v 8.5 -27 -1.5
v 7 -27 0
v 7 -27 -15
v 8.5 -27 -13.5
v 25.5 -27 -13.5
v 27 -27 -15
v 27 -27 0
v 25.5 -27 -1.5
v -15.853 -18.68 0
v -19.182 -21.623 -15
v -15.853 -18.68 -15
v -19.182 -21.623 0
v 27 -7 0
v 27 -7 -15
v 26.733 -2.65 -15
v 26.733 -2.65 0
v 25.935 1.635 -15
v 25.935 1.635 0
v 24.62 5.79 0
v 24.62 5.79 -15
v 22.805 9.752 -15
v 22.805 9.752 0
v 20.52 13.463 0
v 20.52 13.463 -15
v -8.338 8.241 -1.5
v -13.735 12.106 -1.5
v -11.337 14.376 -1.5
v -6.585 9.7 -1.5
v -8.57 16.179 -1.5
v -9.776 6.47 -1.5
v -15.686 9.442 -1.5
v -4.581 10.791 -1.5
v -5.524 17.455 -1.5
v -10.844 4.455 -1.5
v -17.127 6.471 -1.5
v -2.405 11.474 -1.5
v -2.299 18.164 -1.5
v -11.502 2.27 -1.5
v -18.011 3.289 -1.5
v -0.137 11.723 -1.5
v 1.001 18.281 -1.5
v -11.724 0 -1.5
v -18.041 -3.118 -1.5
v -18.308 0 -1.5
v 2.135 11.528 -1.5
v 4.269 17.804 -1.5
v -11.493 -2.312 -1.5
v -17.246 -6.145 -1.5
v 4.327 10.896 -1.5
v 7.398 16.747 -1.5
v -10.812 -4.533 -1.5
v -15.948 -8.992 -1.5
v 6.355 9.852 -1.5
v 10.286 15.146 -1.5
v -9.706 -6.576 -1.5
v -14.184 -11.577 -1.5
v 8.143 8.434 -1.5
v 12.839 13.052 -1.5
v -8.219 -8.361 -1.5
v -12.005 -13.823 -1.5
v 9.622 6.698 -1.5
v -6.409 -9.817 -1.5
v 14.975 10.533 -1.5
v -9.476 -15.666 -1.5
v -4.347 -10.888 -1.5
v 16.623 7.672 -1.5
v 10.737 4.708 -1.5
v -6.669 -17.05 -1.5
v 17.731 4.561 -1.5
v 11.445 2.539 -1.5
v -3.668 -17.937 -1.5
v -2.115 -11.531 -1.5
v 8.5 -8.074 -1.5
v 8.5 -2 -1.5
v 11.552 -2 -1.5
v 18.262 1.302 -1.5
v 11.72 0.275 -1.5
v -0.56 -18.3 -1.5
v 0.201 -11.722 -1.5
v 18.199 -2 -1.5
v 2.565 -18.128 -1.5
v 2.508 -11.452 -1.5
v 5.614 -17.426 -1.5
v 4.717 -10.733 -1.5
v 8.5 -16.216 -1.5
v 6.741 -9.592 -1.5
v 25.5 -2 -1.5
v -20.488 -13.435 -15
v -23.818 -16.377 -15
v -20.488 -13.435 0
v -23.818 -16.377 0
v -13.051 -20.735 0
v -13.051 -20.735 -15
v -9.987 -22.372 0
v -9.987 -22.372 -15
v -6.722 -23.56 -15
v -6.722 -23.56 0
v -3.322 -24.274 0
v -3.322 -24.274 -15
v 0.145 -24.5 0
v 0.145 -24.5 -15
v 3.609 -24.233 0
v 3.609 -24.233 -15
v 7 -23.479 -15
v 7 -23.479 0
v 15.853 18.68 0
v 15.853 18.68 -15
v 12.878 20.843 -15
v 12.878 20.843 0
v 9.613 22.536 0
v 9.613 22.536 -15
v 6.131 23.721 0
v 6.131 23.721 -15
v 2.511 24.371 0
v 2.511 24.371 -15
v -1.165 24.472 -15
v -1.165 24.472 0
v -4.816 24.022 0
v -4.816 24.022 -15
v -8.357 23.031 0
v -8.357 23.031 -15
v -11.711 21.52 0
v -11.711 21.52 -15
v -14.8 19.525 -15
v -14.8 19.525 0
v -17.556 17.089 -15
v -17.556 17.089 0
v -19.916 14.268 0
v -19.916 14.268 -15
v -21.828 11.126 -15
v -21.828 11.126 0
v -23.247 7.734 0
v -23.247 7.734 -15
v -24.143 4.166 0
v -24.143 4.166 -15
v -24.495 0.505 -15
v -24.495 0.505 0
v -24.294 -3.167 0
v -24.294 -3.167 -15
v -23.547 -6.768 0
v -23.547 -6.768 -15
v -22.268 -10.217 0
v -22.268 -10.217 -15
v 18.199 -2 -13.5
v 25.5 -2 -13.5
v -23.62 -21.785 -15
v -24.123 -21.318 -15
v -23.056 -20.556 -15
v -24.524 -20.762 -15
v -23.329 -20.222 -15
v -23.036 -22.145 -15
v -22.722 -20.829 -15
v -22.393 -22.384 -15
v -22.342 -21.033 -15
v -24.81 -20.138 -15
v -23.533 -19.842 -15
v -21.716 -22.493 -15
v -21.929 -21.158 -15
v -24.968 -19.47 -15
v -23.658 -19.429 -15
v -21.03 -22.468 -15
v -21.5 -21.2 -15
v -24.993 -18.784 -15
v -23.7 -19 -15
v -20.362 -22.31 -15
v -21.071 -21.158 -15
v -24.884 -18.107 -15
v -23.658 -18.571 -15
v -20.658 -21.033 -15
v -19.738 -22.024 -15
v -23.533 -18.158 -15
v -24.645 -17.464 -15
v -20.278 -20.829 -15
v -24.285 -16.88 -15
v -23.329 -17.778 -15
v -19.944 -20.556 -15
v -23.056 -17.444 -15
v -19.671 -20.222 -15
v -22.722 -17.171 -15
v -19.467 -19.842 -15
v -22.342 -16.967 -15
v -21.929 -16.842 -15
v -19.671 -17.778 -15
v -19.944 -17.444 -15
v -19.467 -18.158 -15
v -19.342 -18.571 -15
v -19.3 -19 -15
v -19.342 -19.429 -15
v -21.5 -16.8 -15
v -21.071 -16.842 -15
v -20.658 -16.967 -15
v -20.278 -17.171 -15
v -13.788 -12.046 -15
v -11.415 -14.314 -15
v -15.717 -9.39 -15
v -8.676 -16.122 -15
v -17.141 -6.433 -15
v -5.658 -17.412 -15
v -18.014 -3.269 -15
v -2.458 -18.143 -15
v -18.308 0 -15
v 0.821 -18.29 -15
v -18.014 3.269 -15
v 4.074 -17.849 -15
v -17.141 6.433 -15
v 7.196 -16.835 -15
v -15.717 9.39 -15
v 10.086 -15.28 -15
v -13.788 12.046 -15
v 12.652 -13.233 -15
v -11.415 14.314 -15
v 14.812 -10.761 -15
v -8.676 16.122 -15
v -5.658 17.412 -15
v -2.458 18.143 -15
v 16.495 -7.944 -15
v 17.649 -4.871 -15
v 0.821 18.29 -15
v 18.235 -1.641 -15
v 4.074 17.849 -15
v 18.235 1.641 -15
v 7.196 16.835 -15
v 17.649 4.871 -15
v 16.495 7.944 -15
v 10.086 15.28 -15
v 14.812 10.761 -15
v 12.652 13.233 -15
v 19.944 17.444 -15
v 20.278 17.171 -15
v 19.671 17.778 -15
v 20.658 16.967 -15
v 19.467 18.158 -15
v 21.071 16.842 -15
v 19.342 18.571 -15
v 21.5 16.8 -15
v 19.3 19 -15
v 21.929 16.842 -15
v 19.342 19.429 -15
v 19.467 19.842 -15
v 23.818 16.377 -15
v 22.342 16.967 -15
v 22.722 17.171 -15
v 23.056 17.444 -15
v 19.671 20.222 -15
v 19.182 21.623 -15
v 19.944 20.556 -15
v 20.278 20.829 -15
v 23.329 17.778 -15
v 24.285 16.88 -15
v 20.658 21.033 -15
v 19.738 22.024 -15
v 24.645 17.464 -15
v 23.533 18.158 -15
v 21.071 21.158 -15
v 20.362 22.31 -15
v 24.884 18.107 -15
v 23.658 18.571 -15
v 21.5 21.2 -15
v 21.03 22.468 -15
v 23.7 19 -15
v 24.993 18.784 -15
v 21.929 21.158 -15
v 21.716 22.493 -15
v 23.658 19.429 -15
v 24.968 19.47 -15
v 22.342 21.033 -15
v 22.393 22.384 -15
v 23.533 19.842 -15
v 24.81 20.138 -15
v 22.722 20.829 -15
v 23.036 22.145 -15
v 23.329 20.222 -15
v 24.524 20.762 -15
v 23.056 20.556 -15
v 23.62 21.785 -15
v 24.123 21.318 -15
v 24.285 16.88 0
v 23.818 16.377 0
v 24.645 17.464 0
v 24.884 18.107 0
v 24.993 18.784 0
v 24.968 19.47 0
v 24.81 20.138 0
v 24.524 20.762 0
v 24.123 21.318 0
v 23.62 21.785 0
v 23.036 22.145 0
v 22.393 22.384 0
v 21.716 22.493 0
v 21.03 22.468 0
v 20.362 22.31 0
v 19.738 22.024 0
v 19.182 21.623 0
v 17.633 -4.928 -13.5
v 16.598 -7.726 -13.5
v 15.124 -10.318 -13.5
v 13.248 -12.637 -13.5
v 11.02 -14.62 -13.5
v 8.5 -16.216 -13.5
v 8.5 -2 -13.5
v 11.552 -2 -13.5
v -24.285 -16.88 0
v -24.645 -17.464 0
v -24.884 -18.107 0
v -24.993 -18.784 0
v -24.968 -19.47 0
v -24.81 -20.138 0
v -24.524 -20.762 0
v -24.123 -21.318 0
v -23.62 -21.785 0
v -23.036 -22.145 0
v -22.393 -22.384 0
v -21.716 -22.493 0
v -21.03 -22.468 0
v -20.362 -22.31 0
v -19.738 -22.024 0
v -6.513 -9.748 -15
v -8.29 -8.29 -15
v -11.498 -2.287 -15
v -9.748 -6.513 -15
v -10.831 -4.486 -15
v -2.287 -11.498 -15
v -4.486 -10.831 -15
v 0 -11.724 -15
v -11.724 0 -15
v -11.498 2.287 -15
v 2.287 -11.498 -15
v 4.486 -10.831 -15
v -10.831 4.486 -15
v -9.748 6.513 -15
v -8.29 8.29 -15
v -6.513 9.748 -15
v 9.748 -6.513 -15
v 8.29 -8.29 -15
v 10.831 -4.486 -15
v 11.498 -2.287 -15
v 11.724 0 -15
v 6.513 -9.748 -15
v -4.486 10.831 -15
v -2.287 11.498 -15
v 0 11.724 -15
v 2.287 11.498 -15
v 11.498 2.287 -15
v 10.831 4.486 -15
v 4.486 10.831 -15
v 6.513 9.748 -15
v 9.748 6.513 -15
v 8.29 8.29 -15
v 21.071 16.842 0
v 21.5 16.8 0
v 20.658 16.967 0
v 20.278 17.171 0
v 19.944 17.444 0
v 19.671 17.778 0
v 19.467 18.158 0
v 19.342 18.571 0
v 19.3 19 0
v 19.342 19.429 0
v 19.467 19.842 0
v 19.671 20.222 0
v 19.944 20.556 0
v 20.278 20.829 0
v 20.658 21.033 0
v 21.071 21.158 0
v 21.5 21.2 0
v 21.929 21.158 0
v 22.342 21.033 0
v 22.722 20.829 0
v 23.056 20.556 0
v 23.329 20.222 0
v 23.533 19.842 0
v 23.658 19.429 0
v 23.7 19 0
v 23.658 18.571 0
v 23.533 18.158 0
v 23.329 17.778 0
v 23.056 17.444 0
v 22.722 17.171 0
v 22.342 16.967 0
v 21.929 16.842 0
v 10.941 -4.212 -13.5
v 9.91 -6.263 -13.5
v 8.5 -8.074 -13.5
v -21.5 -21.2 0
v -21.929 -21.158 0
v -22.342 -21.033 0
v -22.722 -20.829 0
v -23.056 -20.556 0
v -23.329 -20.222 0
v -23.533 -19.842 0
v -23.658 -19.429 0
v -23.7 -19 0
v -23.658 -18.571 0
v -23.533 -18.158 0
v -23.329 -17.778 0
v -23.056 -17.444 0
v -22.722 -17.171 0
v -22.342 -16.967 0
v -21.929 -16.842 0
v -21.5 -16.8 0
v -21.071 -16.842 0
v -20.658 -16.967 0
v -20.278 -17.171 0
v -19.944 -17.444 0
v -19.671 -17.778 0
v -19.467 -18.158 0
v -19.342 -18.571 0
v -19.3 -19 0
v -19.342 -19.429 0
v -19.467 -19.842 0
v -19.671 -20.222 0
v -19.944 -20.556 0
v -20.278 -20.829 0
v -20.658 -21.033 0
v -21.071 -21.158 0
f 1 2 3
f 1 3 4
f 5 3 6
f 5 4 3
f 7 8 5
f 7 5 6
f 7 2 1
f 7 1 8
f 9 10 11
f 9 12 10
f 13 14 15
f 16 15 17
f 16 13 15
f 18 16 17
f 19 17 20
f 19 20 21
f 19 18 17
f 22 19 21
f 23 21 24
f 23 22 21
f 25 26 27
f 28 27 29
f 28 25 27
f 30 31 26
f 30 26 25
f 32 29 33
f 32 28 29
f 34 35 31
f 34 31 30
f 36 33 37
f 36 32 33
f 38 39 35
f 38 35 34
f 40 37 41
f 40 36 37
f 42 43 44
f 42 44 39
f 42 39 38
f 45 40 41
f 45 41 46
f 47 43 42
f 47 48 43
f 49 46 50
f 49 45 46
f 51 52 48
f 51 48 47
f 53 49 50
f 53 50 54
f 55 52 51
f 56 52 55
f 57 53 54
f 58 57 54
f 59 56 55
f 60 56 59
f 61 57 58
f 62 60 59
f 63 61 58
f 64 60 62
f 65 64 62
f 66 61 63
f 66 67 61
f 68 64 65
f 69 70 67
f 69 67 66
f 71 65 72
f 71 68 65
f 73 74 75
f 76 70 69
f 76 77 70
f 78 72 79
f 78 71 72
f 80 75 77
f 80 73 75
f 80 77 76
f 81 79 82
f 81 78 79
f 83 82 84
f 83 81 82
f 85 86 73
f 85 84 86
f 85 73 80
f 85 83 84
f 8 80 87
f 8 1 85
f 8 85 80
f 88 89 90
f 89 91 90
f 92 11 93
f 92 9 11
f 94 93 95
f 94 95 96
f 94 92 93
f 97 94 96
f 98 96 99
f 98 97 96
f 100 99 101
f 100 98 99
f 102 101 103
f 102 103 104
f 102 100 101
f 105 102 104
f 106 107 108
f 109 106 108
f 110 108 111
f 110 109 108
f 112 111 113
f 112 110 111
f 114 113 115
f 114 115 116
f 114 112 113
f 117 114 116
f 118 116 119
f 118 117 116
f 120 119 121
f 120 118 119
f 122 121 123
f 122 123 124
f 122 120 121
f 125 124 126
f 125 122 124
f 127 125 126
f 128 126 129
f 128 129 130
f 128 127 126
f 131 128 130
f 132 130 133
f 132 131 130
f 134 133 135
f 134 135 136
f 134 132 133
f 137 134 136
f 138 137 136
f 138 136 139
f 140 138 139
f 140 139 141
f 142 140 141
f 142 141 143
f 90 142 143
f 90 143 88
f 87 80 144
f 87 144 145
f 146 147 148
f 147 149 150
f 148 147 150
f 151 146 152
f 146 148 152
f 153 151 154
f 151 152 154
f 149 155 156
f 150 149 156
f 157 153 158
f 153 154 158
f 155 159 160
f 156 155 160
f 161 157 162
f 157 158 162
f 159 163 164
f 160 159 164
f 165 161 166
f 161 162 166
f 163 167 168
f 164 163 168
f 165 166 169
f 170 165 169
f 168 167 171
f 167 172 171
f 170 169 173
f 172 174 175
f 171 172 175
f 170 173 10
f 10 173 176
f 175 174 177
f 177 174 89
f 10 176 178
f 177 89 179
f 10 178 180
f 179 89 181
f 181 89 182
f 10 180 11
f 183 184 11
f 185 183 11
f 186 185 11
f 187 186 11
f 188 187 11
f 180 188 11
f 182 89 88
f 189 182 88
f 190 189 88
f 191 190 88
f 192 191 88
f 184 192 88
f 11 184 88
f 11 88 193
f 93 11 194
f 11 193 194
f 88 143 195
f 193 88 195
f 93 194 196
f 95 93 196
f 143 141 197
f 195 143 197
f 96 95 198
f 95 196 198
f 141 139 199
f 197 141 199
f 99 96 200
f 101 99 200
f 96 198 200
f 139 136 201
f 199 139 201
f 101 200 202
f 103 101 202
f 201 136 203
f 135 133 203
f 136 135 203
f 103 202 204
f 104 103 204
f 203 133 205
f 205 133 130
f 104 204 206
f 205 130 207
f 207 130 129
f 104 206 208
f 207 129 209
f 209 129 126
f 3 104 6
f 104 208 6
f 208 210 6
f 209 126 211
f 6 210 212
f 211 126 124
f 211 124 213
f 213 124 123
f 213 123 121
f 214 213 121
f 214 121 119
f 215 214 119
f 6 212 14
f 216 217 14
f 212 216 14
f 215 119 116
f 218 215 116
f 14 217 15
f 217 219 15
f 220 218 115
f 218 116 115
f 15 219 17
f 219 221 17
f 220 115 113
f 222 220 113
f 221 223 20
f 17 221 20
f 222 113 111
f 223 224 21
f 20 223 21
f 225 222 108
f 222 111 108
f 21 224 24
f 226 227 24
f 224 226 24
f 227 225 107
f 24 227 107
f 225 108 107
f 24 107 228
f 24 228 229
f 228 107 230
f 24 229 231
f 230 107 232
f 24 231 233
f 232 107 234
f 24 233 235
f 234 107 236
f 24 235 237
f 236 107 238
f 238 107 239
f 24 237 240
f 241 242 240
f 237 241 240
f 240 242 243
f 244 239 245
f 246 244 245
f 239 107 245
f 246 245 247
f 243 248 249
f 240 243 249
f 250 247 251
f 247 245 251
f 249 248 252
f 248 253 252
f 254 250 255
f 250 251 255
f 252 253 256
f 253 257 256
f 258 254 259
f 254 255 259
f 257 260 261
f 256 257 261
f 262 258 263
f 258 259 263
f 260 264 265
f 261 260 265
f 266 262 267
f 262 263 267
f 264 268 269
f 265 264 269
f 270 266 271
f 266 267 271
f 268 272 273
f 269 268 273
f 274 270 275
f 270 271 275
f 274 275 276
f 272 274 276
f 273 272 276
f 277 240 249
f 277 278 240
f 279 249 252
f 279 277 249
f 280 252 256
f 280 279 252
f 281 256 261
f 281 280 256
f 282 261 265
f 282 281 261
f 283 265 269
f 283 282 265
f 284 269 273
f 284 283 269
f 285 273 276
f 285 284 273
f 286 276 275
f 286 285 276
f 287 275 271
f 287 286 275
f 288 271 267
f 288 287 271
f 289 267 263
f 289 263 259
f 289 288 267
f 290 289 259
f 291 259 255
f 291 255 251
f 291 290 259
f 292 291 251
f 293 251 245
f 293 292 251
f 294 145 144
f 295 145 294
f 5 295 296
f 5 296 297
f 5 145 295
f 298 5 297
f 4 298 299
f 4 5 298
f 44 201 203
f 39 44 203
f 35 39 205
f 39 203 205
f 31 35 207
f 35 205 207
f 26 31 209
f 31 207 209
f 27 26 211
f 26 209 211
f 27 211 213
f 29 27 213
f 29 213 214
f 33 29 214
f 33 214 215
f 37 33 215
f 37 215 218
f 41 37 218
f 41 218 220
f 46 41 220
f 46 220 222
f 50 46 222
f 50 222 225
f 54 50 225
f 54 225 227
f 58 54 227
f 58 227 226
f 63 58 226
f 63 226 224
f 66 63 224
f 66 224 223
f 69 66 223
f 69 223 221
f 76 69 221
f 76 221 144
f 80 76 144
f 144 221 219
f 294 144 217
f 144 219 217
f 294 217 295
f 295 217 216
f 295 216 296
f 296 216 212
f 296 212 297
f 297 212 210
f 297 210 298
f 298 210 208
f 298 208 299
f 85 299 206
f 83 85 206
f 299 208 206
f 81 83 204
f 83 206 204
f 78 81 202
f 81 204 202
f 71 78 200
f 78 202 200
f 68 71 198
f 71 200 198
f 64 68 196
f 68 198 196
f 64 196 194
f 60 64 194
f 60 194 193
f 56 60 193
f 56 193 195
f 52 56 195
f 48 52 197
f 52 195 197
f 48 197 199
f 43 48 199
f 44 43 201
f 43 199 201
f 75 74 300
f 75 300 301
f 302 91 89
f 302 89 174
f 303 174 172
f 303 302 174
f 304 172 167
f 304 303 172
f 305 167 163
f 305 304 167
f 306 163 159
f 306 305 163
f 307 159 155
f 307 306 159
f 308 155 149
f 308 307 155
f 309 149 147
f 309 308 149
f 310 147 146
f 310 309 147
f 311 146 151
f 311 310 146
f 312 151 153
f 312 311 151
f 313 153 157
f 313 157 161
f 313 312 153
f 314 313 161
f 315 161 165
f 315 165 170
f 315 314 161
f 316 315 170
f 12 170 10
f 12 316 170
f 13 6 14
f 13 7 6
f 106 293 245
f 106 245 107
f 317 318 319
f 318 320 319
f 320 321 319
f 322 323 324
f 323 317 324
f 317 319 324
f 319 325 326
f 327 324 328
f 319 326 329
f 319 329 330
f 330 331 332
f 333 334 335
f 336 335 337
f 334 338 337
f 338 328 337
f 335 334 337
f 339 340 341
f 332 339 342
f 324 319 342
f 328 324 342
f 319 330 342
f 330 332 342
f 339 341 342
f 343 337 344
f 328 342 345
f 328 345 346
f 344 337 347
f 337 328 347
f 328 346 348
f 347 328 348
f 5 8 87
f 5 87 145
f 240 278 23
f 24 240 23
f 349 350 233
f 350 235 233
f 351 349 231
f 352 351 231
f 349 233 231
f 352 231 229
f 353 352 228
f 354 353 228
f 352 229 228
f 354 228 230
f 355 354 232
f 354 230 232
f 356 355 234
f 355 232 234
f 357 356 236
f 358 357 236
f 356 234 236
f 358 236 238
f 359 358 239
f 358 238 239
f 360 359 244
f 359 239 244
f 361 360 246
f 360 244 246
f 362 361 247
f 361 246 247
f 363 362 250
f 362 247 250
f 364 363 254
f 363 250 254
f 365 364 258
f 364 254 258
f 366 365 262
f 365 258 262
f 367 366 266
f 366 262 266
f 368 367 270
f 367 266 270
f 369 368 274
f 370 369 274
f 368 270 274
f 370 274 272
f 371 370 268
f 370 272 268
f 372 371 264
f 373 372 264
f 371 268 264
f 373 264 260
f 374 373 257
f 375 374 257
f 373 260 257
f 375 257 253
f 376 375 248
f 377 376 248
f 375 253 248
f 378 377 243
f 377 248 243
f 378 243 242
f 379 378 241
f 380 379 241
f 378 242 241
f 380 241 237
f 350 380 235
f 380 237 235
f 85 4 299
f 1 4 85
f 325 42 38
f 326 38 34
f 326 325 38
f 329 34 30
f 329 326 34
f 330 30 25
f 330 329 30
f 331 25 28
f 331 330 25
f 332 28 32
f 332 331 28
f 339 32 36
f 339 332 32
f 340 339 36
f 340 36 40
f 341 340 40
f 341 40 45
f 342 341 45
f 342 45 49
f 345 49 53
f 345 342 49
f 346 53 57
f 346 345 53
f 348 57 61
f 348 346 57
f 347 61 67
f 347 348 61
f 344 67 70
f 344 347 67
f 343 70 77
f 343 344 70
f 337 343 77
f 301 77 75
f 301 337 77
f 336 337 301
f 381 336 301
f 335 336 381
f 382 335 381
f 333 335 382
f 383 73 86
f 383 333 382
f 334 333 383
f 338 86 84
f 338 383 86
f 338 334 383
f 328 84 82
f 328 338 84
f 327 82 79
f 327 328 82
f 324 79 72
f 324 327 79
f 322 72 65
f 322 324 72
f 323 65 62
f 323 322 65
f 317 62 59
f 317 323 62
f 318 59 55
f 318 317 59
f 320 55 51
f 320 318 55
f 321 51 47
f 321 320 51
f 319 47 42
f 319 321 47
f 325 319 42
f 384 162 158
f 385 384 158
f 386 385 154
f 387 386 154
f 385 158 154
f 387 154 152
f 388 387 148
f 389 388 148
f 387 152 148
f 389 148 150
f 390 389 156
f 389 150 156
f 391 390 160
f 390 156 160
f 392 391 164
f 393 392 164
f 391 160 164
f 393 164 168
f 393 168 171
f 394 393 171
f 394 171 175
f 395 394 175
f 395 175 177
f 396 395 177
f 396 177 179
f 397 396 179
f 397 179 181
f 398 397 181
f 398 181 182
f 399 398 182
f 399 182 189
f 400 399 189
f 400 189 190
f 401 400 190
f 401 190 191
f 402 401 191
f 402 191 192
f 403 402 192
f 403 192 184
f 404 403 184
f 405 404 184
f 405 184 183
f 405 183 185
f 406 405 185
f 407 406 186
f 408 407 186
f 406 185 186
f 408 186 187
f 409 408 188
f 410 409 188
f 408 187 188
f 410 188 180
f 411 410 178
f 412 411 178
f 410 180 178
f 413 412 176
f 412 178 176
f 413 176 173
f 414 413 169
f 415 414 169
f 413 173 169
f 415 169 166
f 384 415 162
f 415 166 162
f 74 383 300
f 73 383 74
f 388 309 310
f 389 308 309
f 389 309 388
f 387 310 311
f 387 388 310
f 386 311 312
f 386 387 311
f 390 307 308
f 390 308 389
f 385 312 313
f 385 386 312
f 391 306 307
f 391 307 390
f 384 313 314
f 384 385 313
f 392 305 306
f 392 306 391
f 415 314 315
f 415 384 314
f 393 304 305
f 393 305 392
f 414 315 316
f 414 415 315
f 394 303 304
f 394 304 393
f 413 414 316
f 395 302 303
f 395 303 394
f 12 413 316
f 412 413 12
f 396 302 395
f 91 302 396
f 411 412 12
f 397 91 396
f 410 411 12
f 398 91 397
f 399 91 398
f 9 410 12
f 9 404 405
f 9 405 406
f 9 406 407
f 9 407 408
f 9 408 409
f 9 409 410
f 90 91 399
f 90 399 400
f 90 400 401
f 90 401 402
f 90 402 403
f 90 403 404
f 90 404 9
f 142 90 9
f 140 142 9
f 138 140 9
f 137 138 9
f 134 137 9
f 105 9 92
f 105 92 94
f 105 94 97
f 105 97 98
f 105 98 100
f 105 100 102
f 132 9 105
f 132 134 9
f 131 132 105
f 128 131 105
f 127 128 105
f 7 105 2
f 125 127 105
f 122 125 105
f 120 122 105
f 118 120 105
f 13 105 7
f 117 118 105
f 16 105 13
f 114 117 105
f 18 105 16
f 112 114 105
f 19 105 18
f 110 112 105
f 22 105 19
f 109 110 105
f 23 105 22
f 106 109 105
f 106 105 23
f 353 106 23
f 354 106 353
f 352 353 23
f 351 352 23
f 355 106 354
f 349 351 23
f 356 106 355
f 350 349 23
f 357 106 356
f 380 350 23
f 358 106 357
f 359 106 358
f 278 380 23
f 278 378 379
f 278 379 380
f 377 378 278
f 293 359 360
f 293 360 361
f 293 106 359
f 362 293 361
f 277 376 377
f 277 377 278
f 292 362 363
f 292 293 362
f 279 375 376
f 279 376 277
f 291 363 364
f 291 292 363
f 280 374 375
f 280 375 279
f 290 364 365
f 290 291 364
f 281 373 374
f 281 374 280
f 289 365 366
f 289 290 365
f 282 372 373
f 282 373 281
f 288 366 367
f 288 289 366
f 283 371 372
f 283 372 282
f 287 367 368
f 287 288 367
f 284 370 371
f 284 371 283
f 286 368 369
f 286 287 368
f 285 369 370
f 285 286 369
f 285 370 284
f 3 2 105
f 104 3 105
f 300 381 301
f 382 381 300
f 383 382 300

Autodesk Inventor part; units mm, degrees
ref_plane "YZ Plane" through (0, 0, 0) normal (1, 0, 0) x (0, 1, 0)
ref_plane "XZ Plane" through (0, 0, 0) normal (0, 1, 0) x (-1, 0, 0)
ref_plane "XY Plane" through (0, 0, 0) normal (0, 0, 1) x (1, 0, 0)
sketch "Sketch1" plane through (0, 0, 0) normal (0, 0, 1) x (1, 0, 0)
  arc A0 (18.957, 15.5204) -> (15.8526, 18.6801) centre (0, 0) ccw construction
  line L0 (-24.5, 24.5) -> (27, 24.5) construction
  line L1 (27, 24.5) -> (27, -27) construction
  line L2 (27, -27) -> (-24.5, -27) construction
  line L3 (-24.5, -27) -> (-24.5, 24.5) construction
  line L4 (7, -27) -> (27, -27)
  line L5 (27, -27) -> (27, -7)
  arc A1 (27, -7) -> (20.52, 13.4631) centre (-8.55, -7) ccw
  line L6 (7, -27) -> (7, -23.4787)
  line L7 (21.5, 19) -> (0, 0) construction
  line L8 (-21.5, -19) -> (0, 0) construction
  arc A2 (18.8773, 16.6823) -> (23.8177, 16.3773) centre (21.5, 19) ccw construction
  arc A3 (-23.8177, -16.3773) -> (-19.1823, -21.6227) centre (-21.5, -19) ccw
  line L9 (-23.8177, -16.3773) -> (-20.488, -13.4348)
  line L10 (-19.1823, -21.6227) -> (-15.8526, -18.6801)
  line L11 (23.8177, 16.3773) -> (20.52, 13.4631)
  line L12 (19.1823, 21.6227) -> (15.8526, 18.6801)
  arc A4 (7, -23.4787) -> (18.957, 15.5204) centre (0, 0) ccw construction
  arc A5 (15.8526, 18.6801) -> (-20.488, -13.4348) centre (0, 0) ccw
  arc A6 (20.52, 13.4631) -> (18.957, 15.5204) centre (-8.55, -7) ccw construction
  arc A7 (19.1823, 21.6227) -> (18.8773, 16.6823) centre (21.5, 19) ccw construction
  arc A8 (23.8177, 16.3773) -> (19.1823, 21.6227) centre (21.5, 19) ccw
  arc A9 (-18.8773, -16.6823) -> (-23.8177, -16.3773) centre (-21.5, -19) ccw construction
  arc A10 (-19.1823, -21.6227) -> (-18.8773, -16.6823) centre (-21.5, -19) ccw construction
  arc A11 (-15.8526, -18.6801) -> (7, -23.4787) centre (0, 0) ccw
  arc A12 (-20.488, -13.4348) -> (-15.8526, -18.6801) centre (0, 0) ccw construction
  dimension "d0" = 49
  dimension "d1" = 51.5
  dimension "d2" = 51.5
  dimension "d3" = 20
  dimension "d4" = 20
  dimension "d5" = 43
  dimension "d6" = 38
  dimension "d7" = 7
  dimension "d8" = 7
extrude "Extrusion1" add sketch "Sketch1" against normal blind 15
sketch "Sketch2" plane through (7, -27, 0) normal (0, -1, 0) x (1, 0, 0)
  line L0 (20, 0) -> (0, 0) projected
  line L1 (0, 0) -> (0, -15) projected
  line L2 (20, -15) -> (0, -15) projected
  line L3 (20, 0) -> (20, -15) projected
  line L4 (1.5, -1.5) -> (18.5, -1.5)
  line L5 (18.5, -1.5) -> (18.5, -13.5)
  line L6 (18.5, -13.5) -> (1.5, -13.5)
  line L7 (1.5, -13.5) -> (1.5, -1.5)
  point P0 (-7, 0)
  dimension "d22" = 1.5
extrude "Extrusion2" cut sketch "Sketch2" against normal blind 25 contours L4 L5 L6 L7
hole "Hole1" at (-21.5, -19, 0) at (21.5, 19, 0) direction (0, 0, -1) diameter 4.4 end through all
sketch "Sketch3" plane through (0, 0, -15) normal (0, 0, -1) x (-1, 0, 0)
  arc A0 (20.488, -13.4348) -> (-15.8526, 18.6801) centre (0, 0) ccw projected
  circle A1 centre (0, 0) radius 18.3084
  circle A2 centre (0, 0) radius 11.7236
extrude "Extrusion3" cut sketch "Sketch3" against normal blind 13.5
properties part number "fan" material "Acetal Resin, Black"
